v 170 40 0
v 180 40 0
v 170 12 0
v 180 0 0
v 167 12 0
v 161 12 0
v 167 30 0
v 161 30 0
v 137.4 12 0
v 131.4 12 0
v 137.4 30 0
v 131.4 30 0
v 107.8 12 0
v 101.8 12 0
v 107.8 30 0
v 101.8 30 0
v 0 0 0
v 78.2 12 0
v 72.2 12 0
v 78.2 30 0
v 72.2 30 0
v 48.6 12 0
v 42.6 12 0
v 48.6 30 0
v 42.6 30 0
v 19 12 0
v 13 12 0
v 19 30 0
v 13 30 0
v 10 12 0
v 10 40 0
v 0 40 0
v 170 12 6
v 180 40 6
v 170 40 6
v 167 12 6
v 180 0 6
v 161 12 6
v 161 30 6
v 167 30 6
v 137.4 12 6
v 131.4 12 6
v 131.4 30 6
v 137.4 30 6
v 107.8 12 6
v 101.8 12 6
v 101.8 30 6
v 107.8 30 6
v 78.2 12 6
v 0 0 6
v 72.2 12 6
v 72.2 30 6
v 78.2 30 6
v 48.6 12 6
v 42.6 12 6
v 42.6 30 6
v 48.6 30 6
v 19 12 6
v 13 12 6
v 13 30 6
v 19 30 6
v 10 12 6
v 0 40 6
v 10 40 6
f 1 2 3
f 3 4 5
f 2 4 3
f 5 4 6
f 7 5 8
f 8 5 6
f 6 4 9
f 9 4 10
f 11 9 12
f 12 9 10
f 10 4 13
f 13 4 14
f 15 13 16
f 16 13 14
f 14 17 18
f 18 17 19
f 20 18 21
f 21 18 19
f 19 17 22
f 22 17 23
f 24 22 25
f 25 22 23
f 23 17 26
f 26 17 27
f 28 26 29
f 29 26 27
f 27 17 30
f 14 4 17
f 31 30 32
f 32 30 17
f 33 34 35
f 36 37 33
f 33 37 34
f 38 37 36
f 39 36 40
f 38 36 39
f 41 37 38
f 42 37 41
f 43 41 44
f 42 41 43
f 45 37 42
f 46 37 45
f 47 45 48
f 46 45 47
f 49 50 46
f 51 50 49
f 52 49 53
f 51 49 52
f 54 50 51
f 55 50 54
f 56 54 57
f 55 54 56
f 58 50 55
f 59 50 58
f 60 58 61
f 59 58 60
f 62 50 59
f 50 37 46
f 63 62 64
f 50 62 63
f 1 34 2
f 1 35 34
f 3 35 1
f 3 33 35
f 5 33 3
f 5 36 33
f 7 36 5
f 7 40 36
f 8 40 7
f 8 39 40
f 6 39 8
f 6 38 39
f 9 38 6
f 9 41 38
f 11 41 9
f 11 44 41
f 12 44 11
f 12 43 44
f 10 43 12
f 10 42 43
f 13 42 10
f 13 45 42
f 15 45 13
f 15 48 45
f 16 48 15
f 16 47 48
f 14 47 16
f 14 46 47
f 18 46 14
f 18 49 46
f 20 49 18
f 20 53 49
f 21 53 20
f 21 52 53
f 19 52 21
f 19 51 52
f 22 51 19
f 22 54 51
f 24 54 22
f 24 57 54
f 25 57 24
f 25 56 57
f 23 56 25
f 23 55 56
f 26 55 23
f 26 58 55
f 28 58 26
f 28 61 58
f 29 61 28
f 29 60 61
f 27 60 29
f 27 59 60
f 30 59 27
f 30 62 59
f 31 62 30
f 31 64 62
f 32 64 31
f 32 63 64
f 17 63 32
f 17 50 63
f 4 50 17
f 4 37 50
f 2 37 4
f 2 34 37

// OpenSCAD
$fn = 32;

// ----------------------------------------------------------------------
// Guard grille: 6 slats over a 180 x 40 mm plate
// ----------------------------------------------------------------------

// --- parameters (mm) ---
profile_height = 6;       // extrusion height
profile_points = 32;      // points of the closed outline

profile = [[0, 0], [180, 0], [180, 40], [170, 40], [170, 12], [167, 12], [167, 30], [161, 30], [161, 12], [137.4, 12], [137.4, 30], [131.4, 30], [131.4, 12], [107.8, 12], [107.8, 30], [101.8, 30], [101.8, 12], [78.2, 12], [78.2, 30], [72.2, 30], [72.2, 12], [48.6, 12], [48.6, 30], [42.6, 30], [42.6, 12], [19, 12], [19, 30], [13, 30], [13, 12], [10, 12], [10, 40], [0, 40]];  // single closed polygon, 32 points, counter clockwise

// --- the one profile operation ---
linear_extrude(height = profile_height) polygon(points = profile);
